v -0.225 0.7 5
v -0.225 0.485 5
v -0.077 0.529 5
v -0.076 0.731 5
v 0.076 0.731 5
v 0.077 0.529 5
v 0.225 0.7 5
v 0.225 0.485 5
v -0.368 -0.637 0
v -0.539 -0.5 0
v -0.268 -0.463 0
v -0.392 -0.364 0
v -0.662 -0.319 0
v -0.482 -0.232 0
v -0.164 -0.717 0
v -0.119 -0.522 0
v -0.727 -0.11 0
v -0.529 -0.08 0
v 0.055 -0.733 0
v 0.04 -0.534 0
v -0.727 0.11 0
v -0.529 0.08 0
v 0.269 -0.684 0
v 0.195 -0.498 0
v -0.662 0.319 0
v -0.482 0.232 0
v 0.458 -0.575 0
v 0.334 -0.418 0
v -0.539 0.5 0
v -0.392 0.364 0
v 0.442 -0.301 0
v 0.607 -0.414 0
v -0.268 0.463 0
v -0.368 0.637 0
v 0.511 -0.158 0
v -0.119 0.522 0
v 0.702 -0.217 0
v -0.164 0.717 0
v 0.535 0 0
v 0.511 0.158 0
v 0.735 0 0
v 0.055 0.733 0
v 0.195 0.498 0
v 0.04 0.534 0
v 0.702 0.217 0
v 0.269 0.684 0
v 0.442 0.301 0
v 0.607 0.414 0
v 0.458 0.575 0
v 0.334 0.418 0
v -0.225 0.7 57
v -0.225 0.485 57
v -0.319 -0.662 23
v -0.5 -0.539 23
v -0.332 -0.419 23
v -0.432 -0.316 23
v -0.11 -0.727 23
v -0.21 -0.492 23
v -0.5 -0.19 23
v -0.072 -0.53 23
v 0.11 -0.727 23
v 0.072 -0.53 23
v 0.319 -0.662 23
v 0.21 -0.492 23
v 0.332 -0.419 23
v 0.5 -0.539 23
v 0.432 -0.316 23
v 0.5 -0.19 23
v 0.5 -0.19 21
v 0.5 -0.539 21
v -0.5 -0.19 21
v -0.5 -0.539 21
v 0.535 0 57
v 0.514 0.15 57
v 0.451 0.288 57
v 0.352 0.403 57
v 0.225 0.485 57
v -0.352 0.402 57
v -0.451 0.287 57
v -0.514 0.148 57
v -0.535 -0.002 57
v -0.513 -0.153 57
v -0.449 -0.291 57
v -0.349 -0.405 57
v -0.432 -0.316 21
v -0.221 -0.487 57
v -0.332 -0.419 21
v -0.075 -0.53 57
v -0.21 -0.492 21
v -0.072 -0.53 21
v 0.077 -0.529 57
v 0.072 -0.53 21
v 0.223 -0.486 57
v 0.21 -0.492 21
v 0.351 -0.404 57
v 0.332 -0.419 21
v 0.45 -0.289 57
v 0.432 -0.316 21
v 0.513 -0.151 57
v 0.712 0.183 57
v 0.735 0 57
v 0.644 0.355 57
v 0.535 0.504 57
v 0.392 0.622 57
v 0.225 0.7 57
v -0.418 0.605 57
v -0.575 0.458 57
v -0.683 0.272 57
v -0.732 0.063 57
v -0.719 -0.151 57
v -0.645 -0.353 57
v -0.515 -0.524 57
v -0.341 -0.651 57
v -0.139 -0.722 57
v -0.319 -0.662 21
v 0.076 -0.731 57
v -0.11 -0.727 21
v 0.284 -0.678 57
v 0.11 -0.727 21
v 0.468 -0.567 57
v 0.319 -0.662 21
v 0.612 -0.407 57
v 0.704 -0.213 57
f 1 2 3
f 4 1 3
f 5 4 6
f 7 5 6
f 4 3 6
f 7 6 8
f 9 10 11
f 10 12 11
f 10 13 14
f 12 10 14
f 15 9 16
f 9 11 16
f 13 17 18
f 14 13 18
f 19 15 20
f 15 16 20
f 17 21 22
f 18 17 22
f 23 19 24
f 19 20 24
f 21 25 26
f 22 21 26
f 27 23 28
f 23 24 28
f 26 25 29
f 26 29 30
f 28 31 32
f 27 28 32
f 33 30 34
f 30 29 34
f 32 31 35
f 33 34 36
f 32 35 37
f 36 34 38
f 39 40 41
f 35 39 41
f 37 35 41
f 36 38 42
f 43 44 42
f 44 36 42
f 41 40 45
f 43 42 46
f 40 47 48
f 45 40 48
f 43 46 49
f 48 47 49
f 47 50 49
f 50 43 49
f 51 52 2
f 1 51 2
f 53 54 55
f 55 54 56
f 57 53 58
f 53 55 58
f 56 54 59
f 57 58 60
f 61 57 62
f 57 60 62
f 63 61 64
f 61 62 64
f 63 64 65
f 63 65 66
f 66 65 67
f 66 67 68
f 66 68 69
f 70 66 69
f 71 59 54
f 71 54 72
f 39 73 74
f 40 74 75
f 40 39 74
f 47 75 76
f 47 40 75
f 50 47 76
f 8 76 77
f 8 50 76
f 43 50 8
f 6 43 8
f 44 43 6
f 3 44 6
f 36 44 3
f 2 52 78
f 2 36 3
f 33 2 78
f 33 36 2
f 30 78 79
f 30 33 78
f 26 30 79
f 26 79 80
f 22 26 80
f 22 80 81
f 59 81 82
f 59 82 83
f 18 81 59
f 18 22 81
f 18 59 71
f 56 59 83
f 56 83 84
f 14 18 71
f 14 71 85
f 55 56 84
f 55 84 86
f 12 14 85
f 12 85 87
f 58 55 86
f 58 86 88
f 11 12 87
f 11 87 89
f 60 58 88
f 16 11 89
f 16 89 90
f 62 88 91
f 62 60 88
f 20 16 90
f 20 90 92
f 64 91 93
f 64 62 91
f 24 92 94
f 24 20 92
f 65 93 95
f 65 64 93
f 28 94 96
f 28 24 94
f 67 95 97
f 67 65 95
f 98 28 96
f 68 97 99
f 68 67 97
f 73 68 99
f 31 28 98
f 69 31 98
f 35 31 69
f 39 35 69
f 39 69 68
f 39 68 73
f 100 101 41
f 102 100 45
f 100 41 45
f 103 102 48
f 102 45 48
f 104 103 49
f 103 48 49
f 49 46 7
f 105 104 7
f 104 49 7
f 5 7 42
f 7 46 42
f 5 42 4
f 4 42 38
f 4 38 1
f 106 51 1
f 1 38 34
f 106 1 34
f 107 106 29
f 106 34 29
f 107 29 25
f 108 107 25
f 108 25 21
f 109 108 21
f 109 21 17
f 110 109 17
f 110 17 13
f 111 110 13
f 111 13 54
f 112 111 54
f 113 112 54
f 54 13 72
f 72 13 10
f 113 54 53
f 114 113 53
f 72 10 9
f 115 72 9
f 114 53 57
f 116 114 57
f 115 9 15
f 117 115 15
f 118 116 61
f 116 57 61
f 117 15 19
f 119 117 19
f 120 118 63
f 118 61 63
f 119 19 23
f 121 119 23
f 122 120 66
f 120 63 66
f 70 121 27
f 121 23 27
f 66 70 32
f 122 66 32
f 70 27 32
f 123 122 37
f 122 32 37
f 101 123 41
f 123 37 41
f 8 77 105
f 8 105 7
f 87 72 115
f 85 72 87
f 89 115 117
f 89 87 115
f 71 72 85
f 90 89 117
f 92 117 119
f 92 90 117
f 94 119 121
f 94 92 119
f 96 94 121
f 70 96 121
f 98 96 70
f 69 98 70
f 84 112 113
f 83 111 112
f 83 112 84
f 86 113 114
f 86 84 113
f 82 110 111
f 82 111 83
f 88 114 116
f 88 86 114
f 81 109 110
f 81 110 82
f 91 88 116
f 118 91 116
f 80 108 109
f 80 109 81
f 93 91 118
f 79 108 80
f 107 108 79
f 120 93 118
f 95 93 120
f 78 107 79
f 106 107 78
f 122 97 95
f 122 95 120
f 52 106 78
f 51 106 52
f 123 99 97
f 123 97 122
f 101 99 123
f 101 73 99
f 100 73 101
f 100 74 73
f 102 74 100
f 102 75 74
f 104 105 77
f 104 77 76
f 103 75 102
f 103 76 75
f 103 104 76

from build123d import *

# Parameters (mm, degrees)
SKETCH1_R           = 0.735
SKETCH1_R_2         = 0.535
BOSS_EXTRUDE1_DEPTH = 57
SKETCH2_W           = 0.45
SKETCH2_H           = 53
CUT_EXTRUDE1_DEPTH  = 1.735
SKETCH3_W           = 1
SKETCH3_H           = 2
CUT_EXTRUDE2_DEPTH  = 1.735


with BuildPart() as part:
    # Sketch1 → Boss-Extrude1 (new body)
    with BuildSketch(Plane.XY):
        Circle(SKETCH1_R)
        Circle(SKETCH1_R_2, mode=Mode.SUBTRACT)
    extrude(amount=BOSS_EXTRUDE1_DEPTH)

    # Sketch2 → Cut-Extrude1 (cut, through all)
    with BuildSketch(Plane(origin=(0, 0, 0), x_dir=(1, 0, 0), z_dir=(0, 1, 0))):
        with Locations((0, -31.5)):
            Rectangle(SKETCH2_W, SKETCH2_H)
    extrude(amount=CUT_EXTRUDE1_DEPTH, mode=Mode.SUBTRACT)

    # Sketch3 → Cut-Extrude2 (cut, through all)
    with BuildSketch(Plane(origin=(0, 0, 0), x_dir=(1, 0, 0), z_dir=(0, 1, 0))):
        with Locations((0, -22)):
            Rectangle(SKETCH3_W, SKETCH3_H)
    extrude(amount=-CUT_EXTRUDE2_DEPTH, mode=Mode.SUBTRACT)


solid = part.part
